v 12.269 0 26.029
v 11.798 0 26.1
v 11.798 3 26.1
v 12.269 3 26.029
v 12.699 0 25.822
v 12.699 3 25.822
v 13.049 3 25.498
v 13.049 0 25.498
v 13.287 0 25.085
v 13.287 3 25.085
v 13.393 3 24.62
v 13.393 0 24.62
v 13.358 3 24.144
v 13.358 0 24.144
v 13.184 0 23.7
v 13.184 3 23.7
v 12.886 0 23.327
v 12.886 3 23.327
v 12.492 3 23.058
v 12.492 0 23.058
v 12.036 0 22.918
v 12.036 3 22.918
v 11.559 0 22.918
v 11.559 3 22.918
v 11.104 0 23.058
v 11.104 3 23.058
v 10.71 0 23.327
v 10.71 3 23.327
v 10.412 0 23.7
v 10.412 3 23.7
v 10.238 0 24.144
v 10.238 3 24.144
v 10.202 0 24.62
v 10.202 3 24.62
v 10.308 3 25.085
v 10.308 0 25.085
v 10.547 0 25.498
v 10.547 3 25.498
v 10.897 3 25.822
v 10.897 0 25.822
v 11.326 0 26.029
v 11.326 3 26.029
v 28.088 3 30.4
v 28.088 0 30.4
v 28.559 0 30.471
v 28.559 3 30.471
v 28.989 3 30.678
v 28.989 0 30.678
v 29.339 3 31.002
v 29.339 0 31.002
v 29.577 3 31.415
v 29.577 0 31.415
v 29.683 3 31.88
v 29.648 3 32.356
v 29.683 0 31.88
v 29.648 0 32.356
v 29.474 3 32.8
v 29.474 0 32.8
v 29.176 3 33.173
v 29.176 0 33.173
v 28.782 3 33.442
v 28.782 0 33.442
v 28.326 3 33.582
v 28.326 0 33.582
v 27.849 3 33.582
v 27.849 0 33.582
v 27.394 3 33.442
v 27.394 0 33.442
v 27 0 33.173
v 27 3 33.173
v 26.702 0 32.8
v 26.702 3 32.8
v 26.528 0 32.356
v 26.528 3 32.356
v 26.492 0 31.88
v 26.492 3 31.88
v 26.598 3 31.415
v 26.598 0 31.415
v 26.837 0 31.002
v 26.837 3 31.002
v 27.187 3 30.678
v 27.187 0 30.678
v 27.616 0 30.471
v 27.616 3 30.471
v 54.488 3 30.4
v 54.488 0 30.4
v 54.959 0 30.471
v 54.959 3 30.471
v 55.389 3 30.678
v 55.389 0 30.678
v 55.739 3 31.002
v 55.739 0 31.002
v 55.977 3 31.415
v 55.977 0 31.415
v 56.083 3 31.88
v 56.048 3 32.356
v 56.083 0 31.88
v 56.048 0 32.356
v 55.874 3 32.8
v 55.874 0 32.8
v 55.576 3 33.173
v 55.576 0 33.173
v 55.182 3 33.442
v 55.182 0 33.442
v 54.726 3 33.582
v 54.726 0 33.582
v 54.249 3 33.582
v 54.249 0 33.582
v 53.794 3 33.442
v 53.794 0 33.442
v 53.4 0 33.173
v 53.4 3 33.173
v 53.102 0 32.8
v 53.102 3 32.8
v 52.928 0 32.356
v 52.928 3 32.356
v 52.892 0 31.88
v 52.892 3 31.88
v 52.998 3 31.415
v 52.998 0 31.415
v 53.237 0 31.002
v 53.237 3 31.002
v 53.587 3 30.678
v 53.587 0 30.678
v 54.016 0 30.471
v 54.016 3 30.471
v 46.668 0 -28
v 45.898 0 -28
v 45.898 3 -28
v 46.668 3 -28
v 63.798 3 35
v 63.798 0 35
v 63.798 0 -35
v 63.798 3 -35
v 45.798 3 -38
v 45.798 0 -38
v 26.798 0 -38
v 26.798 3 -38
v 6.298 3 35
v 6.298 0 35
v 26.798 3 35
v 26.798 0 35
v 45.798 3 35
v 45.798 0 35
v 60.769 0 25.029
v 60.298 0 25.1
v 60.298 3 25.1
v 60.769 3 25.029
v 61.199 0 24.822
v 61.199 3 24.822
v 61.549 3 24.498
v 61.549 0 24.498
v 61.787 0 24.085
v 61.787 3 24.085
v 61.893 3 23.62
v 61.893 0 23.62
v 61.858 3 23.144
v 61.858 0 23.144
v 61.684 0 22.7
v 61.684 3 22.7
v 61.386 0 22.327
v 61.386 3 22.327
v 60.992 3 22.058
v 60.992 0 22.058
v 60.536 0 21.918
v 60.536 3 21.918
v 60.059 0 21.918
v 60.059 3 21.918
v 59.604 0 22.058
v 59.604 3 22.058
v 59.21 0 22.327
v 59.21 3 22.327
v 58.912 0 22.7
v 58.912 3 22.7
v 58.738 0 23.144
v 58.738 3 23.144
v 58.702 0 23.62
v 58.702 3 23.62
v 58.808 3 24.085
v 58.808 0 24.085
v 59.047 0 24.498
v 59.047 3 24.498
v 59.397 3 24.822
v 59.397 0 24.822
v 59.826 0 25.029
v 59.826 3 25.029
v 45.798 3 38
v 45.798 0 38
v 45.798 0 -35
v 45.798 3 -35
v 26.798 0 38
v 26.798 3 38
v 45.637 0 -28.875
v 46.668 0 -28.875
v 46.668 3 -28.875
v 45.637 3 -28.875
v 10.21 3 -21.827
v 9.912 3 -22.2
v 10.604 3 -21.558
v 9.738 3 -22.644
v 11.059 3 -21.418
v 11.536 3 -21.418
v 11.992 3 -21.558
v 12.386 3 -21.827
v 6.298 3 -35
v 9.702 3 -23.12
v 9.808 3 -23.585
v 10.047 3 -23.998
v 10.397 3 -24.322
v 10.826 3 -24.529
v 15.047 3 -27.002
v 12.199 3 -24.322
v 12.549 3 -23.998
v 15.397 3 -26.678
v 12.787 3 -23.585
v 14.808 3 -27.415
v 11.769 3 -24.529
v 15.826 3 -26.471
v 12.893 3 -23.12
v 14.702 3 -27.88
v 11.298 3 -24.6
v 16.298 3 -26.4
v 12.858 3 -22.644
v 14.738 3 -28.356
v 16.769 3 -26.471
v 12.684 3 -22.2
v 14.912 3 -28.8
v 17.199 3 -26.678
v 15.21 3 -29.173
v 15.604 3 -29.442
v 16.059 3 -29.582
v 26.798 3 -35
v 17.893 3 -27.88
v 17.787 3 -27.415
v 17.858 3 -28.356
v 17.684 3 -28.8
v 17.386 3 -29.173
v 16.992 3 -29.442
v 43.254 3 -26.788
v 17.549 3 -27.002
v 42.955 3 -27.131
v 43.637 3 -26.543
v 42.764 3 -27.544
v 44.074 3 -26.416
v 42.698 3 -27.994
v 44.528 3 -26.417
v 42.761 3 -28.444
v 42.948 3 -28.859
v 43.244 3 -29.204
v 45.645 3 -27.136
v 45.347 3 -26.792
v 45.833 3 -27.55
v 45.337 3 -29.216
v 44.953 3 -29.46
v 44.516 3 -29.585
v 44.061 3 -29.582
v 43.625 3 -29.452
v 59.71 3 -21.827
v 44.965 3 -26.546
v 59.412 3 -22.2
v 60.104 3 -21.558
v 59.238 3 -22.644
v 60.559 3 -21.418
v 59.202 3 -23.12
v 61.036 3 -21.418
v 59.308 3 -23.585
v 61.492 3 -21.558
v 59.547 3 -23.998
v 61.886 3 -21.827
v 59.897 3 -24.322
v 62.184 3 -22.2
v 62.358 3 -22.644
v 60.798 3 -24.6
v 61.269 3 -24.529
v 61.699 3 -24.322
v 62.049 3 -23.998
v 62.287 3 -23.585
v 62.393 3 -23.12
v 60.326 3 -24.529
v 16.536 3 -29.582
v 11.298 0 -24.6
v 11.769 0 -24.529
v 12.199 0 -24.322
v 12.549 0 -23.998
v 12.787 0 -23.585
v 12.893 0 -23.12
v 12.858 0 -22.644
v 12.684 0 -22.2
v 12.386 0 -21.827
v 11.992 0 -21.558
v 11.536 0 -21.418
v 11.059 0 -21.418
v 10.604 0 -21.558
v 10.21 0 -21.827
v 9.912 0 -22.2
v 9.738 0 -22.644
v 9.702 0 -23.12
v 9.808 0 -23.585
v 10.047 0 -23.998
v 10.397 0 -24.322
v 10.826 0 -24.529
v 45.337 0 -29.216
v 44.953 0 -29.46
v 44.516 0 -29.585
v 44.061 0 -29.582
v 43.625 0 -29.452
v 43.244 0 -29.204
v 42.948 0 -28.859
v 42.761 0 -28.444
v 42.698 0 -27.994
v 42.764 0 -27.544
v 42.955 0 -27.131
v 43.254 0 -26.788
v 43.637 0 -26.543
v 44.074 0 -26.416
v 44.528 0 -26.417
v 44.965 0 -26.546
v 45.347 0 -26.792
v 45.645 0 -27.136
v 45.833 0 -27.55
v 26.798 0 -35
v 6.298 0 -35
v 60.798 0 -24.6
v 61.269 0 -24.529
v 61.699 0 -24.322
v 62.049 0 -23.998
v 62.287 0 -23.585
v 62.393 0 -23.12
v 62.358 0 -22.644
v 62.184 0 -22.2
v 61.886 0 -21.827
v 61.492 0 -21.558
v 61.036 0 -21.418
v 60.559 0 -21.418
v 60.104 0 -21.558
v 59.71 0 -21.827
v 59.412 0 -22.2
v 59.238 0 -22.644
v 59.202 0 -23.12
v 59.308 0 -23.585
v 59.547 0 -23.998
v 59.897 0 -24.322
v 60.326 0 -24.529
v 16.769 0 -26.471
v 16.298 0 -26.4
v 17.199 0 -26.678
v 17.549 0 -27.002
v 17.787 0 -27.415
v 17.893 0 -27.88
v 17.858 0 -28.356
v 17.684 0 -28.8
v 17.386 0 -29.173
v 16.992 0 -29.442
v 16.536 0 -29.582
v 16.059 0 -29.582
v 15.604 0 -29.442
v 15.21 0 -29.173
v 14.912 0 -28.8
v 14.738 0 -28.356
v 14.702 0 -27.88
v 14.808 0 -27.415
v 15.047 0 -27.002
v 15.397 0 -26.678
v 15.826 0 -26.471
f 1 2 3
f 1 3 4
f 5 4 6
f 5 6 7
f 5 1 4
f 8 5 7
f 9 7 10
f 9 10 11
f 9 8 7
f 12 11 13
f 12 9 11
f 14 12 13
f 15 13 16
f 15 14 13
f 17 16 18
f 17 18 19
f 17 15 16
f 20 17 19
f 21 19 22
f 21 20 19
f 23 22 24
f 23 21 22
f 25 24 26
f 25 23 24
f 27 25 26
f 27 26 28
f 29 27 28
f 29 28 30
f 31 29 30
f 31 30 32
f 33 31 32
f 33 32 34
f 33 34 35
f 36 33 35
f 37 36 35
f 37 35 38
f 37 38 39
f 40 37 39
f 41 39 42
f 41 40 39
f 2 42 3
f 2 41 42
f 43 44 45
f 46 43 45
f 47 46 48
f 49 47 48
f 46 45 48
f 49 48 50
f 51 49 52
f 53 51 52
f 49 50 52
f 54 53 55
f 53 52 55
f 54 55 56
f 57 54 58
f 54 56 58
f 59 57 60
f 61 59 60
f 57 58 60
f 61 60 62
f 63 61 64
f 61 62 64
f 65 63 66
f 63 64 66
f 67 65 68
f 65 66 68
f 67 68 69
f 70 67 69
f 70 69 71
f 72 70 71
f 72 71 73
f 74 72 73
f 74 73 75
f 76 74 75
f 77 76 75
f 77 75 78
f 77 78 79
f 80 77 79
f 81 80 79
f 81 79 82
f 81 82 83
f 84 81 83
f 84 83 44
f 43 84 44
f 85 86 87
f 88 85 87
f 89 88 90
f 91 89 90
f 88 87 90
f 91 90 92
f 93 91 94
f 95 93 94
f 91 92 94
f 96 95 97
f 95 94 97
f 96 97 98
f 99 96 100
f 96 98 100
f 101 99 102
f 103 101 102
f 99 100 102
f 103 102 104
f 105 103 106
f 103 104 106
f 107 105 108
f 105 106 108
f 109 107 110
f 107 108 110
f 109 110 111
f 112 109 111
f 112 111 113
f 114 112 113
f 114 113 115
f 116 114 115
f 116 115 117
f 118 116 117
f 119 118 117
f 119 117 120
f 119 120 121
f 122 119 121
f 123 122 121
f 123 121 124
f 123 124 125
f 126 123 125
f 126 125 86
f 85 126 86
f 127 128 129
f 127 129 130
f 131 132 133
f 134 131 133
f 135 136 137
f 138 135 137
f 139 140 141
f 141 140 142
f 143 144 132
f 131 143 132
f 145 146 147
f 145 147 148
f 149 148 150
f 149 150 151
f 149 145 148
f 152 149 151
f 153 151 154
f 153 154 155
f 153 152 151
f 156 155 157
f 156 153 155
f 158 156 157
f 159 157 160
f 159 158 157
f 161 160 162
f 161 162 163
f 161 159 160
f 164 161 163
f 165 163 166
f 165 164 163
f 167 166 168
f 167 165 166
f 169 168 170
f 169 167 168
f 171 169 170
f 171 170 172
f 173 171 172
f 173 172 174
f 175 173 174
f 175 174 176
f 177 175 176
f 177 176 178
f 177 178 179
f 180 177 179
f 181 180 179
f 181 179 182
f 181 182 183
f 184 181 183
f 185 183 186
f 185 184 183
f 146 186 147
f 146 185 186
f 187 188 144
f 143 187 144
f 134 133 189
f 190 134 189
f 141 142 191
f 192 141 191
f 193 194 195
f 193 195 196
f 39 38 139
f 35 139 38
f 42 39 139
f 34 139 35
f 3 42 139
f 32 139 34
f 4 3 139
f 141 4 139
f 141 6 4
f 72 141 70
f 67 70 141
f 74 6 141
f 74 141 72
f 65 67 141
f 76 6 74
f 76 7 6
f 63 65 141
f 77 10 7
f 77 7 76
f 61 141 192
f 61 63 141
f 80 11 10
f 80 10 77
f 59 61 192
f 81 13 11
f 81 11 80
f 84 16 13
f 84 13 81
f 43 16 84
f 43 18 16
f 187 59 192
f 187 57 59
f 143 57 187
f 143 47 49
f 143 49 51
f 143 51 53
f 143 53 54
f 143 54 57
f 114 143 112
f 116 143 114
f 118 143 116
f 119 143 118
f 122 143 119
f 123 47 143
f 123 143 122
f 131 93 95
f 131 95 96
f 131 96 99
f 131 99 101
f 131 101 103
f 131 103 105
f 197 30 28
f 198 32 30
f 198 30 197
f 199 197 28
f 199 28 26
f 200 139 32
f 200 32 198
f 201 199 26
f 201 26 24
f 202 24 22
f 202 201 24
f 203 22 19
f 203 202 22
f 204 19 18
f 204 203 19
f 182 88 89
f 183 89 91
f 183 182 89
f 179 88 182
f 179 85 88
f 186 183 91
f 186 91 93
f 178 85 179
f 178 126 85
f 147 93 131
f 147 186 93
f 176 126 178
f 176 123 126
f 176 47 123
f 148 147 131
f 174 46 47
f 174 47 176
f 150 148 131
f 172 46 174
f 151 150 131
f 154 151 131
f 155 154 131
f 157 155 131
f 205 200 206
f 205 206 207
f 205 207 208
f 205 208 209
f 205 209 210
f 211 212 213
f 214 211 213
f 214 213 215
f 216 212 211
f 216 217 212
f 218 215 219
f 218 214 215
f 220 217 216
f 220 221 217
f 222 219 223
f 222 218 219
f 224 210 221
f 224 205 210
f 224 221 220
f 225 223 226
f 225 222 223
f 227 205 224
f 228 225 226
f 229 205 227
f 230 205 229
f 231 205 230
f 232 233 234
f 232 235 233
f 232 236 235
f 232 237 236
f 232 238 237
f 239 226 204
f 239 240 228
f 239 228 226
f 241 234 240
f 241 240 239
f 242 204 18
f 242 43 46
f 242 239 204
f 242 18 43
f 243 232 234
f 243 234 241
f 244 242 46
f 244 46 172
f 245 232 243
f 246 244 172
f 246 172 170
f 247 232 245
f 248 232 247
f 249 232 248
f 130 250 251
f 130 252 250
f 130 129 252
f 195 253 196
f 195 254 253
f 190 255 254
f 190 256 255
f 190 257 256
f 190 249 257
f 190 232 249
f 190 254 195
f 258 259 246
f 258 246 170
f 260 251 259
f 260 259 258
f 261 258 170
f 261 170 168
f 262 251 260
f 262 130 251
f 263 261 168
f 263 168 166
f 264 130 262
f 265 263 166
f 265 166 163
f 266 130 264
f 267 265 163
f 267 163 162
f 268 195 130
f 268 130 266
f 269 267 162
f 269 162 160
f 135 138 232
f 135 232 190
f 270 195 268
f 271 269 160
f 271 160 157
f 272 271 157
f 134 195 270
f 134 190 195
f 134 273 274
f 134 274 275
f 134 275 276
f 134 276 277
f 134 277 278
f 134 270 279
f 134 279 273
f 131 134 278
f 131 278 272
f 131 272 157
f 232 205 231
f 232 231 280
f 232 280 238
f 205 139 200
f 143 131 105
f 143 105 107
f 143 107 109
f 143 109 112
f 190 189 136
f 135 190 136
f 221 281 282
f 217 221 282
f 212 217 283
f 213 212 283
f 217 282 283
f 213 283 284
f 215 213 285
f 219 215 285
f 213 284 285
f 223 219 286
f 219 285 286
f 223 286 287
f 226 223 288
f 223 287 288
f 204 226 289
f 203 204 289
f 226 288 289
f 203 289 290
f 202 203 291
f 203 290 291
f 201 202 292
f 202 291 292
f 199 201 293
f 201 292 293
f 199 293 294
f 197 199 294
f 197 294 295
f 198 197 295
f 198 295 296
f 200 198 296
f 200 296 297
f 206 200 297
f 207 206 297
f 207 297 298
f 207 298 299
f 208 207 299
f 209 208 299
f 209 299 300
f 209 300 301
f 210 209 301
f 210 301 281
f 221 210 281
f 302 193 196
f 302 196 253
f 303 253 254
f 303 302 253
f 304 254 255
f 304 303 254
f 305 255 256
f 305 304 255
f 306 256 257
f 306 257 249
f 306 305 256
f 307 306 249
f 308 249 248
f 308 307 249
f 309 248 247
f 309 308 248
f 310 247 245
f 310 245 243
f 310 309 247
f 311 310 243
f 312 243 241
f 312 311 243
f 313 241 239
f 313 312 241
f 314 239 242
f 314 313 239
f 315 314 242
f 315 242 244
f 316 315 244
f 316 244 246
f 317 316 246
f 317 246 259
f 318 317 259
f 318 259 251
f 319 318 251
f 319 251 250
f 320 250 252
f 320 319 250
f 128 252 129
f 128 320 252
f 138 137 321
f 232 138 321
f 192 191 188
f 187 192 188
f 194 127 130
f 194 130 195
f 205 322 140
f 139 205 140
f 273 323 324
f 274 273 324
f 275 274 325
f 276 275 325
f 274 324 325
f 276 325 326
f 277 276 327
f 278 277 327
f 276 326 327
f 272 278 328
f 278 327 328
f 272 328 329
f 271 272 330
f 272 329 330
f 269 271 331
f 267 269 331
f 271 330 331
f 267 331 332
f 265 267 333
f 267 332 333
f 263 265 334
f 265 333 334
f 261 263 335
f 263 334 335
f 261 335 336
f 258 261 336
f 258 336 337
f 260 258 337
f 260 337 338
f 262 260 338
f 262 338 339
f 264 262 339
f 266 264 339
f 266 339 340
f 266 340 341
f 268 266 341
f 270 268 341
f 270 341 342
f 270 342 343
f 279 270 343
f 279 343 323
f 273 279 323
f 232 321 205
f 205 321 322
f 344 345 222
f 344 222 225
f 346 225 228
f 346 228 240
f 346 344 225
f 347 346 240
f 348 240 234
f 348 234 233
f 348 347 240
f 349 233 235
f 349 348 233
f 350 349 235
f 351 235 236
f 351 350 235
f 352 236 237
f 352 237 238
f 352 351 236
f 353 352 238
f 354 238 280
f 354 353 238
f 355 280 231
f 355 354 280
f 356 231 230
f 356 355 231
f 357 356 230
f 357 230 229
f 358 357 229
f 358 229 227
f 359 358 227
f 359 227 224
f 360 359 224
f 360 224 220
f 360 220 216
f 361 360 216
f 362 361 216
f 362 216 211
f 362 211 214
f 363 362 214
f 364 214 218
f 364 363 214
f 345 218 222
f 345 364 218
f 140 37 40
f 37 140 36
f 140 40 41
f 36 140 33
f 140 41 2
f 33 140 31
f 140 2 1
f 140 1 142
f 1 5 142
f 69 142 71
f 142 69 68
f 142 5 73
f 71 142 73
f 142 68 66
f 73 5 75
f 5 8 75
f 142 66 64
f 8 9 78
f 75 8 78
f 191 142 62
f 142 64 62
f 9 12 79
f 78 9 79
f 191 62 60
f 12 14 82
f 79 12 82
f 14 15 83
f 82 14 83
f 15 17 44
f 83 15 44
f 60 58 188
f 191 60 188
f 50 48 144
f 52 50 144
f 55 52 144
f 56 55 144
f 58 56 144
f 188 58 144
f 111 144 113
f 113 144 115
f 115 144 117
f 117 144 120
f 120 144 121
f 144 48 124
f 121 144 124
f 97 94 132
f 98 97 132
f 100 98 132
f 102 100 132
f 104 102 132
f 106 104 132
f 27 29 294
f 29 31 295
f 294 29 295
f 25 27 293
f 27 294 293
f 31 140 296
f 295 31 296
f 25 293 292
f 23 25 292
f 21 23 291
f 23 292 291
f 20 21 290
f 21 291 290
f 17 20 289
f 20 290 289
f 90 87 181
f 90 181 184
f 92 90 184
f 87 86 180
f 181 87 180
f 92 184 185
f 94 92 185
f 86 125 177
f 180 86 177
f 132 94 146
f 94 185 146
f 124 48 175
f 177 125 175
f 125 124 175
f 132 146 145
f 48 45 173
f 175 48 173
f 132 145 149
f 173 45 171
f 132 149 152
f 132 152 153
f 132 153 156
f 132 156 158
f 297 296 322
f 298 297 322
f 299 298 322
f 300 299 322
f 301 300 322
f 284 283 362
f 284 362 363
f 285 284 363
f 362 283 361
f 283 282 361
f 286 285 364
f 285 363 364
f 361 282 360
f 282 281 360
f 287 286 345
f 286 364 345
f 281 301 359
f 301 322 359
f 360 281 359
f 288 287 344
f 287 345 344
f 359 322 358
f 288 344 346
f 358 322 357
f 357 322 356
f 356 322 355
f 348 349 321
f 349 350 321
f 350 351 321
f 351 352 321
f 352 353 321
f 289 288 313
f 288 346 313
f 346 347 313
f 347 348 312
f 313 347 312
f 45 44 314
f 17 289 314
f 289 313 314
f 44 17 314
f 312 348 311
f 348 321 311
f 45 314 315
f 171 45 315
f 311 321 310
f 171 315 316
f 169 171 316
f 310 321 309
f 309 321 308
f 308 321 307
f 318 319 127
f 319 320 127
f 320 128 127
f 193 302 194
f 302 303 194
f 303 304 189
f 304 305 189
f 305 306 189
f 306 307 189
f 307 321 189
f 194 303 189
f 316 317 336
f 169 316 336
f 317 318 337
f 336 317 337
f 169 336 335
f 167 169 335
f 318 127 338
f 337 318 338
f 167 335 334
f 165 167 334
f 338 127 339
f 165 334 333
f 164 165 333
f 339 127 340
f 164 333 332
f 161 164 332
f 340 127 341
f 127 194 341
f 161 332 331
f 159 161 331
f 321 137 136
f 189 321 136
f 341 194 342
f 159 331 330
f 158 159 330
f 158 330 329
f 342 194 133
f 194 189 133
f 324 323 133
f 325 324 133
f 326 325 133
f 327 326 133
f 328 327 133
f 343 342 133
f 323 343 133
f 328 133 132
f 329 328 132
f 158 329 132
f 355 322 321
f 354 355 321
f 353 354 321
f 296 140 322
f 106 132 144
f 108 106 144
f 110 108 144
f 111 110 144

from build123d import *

# Parameters (mm, degrees)
SKETCH1_R           = 1.6
BOSS_EXTRUDE1_DEPTH = 3
SKETCH3_R           = 1.6
CUT_EXTRUDE1_DEPTH  = 10


with BuildPart() as part:
    # Sketch1 → Boss-Extrude1 (new body)
    with BuildSketch(Plane(origin=(0, 0, 0), x_dir=(1, 0, 0), z_dir=(0, 1, 0))):
        Polygon((63.79786164, -35), (63.79786164, 35), (45.79786164, 35), (45.79786164, 38), (26.79786164, 38), (26.79786164, 35), (8.79786164, 35), (6.29786164, 35), (6.29786164, -35), (8.79786164, -35), (26.79786164, -35), (26.79786164, -38), (45.79786164, -38), (45.79786164, -35), align=None)
        with Locations(Location((11.79786164, -24.5, 0), (0, 0, 270))):
            Circle(SKETCH1_R, mode=Mode.SUBTRACT)
        with Locations(Location((60.29786164, -23.5, 0), (0, 0, 270))):
            Circle(SKETCH1_R, mode=Mode.SUBTRACT)
        with Locations(Location((16.29786164, 28, 0), (0, 0, 270))):
            Circle(SKETCH1_R, mode=Mode.SUBTRACT)
        with BuildLine():
            Line((45.89786164, 28), (46.668055556, 28))
            Line((46.668055556, 28), (46.668055556, 28.874884233))
            Line((46.668055556, 28.874884233), (45.637480085, 28.874884233))
            ThreePointArc((45.637480085, 28.874884233), (42.764338, 27.543595307), (45.89786164, 28))
        make_face(mode=Mode.SUBTRACT)
    extrude(amount=BOSS_EXTRUDE1_DEPTH)

    # Sketch3 → Cut-Extrude1 (cut)
    with BuildSketch(Plane.XZ):
        with Locations(Location((11.29786164, -23, 0), (0, 0, 270))):
            Circle(SKETCH3_R)
        with Locations(Location((60.79786164, -23, 0), (0, 0, 270))):
            Circle(SKETCH3_R)
        with Locations(Location((54.48786164, 32, 0), (0, 0, 270))):
            Circle(SKETCH3_R)
        with Locations(Location((28.08786164, 32, 0), (0, 0, 270))):
            Circle(SKETCH3_R)
    extrude(amount=-CUT_EXTRUDE1_DEPTH, mode=Mode.SUBTRACT)


solid = part.part
